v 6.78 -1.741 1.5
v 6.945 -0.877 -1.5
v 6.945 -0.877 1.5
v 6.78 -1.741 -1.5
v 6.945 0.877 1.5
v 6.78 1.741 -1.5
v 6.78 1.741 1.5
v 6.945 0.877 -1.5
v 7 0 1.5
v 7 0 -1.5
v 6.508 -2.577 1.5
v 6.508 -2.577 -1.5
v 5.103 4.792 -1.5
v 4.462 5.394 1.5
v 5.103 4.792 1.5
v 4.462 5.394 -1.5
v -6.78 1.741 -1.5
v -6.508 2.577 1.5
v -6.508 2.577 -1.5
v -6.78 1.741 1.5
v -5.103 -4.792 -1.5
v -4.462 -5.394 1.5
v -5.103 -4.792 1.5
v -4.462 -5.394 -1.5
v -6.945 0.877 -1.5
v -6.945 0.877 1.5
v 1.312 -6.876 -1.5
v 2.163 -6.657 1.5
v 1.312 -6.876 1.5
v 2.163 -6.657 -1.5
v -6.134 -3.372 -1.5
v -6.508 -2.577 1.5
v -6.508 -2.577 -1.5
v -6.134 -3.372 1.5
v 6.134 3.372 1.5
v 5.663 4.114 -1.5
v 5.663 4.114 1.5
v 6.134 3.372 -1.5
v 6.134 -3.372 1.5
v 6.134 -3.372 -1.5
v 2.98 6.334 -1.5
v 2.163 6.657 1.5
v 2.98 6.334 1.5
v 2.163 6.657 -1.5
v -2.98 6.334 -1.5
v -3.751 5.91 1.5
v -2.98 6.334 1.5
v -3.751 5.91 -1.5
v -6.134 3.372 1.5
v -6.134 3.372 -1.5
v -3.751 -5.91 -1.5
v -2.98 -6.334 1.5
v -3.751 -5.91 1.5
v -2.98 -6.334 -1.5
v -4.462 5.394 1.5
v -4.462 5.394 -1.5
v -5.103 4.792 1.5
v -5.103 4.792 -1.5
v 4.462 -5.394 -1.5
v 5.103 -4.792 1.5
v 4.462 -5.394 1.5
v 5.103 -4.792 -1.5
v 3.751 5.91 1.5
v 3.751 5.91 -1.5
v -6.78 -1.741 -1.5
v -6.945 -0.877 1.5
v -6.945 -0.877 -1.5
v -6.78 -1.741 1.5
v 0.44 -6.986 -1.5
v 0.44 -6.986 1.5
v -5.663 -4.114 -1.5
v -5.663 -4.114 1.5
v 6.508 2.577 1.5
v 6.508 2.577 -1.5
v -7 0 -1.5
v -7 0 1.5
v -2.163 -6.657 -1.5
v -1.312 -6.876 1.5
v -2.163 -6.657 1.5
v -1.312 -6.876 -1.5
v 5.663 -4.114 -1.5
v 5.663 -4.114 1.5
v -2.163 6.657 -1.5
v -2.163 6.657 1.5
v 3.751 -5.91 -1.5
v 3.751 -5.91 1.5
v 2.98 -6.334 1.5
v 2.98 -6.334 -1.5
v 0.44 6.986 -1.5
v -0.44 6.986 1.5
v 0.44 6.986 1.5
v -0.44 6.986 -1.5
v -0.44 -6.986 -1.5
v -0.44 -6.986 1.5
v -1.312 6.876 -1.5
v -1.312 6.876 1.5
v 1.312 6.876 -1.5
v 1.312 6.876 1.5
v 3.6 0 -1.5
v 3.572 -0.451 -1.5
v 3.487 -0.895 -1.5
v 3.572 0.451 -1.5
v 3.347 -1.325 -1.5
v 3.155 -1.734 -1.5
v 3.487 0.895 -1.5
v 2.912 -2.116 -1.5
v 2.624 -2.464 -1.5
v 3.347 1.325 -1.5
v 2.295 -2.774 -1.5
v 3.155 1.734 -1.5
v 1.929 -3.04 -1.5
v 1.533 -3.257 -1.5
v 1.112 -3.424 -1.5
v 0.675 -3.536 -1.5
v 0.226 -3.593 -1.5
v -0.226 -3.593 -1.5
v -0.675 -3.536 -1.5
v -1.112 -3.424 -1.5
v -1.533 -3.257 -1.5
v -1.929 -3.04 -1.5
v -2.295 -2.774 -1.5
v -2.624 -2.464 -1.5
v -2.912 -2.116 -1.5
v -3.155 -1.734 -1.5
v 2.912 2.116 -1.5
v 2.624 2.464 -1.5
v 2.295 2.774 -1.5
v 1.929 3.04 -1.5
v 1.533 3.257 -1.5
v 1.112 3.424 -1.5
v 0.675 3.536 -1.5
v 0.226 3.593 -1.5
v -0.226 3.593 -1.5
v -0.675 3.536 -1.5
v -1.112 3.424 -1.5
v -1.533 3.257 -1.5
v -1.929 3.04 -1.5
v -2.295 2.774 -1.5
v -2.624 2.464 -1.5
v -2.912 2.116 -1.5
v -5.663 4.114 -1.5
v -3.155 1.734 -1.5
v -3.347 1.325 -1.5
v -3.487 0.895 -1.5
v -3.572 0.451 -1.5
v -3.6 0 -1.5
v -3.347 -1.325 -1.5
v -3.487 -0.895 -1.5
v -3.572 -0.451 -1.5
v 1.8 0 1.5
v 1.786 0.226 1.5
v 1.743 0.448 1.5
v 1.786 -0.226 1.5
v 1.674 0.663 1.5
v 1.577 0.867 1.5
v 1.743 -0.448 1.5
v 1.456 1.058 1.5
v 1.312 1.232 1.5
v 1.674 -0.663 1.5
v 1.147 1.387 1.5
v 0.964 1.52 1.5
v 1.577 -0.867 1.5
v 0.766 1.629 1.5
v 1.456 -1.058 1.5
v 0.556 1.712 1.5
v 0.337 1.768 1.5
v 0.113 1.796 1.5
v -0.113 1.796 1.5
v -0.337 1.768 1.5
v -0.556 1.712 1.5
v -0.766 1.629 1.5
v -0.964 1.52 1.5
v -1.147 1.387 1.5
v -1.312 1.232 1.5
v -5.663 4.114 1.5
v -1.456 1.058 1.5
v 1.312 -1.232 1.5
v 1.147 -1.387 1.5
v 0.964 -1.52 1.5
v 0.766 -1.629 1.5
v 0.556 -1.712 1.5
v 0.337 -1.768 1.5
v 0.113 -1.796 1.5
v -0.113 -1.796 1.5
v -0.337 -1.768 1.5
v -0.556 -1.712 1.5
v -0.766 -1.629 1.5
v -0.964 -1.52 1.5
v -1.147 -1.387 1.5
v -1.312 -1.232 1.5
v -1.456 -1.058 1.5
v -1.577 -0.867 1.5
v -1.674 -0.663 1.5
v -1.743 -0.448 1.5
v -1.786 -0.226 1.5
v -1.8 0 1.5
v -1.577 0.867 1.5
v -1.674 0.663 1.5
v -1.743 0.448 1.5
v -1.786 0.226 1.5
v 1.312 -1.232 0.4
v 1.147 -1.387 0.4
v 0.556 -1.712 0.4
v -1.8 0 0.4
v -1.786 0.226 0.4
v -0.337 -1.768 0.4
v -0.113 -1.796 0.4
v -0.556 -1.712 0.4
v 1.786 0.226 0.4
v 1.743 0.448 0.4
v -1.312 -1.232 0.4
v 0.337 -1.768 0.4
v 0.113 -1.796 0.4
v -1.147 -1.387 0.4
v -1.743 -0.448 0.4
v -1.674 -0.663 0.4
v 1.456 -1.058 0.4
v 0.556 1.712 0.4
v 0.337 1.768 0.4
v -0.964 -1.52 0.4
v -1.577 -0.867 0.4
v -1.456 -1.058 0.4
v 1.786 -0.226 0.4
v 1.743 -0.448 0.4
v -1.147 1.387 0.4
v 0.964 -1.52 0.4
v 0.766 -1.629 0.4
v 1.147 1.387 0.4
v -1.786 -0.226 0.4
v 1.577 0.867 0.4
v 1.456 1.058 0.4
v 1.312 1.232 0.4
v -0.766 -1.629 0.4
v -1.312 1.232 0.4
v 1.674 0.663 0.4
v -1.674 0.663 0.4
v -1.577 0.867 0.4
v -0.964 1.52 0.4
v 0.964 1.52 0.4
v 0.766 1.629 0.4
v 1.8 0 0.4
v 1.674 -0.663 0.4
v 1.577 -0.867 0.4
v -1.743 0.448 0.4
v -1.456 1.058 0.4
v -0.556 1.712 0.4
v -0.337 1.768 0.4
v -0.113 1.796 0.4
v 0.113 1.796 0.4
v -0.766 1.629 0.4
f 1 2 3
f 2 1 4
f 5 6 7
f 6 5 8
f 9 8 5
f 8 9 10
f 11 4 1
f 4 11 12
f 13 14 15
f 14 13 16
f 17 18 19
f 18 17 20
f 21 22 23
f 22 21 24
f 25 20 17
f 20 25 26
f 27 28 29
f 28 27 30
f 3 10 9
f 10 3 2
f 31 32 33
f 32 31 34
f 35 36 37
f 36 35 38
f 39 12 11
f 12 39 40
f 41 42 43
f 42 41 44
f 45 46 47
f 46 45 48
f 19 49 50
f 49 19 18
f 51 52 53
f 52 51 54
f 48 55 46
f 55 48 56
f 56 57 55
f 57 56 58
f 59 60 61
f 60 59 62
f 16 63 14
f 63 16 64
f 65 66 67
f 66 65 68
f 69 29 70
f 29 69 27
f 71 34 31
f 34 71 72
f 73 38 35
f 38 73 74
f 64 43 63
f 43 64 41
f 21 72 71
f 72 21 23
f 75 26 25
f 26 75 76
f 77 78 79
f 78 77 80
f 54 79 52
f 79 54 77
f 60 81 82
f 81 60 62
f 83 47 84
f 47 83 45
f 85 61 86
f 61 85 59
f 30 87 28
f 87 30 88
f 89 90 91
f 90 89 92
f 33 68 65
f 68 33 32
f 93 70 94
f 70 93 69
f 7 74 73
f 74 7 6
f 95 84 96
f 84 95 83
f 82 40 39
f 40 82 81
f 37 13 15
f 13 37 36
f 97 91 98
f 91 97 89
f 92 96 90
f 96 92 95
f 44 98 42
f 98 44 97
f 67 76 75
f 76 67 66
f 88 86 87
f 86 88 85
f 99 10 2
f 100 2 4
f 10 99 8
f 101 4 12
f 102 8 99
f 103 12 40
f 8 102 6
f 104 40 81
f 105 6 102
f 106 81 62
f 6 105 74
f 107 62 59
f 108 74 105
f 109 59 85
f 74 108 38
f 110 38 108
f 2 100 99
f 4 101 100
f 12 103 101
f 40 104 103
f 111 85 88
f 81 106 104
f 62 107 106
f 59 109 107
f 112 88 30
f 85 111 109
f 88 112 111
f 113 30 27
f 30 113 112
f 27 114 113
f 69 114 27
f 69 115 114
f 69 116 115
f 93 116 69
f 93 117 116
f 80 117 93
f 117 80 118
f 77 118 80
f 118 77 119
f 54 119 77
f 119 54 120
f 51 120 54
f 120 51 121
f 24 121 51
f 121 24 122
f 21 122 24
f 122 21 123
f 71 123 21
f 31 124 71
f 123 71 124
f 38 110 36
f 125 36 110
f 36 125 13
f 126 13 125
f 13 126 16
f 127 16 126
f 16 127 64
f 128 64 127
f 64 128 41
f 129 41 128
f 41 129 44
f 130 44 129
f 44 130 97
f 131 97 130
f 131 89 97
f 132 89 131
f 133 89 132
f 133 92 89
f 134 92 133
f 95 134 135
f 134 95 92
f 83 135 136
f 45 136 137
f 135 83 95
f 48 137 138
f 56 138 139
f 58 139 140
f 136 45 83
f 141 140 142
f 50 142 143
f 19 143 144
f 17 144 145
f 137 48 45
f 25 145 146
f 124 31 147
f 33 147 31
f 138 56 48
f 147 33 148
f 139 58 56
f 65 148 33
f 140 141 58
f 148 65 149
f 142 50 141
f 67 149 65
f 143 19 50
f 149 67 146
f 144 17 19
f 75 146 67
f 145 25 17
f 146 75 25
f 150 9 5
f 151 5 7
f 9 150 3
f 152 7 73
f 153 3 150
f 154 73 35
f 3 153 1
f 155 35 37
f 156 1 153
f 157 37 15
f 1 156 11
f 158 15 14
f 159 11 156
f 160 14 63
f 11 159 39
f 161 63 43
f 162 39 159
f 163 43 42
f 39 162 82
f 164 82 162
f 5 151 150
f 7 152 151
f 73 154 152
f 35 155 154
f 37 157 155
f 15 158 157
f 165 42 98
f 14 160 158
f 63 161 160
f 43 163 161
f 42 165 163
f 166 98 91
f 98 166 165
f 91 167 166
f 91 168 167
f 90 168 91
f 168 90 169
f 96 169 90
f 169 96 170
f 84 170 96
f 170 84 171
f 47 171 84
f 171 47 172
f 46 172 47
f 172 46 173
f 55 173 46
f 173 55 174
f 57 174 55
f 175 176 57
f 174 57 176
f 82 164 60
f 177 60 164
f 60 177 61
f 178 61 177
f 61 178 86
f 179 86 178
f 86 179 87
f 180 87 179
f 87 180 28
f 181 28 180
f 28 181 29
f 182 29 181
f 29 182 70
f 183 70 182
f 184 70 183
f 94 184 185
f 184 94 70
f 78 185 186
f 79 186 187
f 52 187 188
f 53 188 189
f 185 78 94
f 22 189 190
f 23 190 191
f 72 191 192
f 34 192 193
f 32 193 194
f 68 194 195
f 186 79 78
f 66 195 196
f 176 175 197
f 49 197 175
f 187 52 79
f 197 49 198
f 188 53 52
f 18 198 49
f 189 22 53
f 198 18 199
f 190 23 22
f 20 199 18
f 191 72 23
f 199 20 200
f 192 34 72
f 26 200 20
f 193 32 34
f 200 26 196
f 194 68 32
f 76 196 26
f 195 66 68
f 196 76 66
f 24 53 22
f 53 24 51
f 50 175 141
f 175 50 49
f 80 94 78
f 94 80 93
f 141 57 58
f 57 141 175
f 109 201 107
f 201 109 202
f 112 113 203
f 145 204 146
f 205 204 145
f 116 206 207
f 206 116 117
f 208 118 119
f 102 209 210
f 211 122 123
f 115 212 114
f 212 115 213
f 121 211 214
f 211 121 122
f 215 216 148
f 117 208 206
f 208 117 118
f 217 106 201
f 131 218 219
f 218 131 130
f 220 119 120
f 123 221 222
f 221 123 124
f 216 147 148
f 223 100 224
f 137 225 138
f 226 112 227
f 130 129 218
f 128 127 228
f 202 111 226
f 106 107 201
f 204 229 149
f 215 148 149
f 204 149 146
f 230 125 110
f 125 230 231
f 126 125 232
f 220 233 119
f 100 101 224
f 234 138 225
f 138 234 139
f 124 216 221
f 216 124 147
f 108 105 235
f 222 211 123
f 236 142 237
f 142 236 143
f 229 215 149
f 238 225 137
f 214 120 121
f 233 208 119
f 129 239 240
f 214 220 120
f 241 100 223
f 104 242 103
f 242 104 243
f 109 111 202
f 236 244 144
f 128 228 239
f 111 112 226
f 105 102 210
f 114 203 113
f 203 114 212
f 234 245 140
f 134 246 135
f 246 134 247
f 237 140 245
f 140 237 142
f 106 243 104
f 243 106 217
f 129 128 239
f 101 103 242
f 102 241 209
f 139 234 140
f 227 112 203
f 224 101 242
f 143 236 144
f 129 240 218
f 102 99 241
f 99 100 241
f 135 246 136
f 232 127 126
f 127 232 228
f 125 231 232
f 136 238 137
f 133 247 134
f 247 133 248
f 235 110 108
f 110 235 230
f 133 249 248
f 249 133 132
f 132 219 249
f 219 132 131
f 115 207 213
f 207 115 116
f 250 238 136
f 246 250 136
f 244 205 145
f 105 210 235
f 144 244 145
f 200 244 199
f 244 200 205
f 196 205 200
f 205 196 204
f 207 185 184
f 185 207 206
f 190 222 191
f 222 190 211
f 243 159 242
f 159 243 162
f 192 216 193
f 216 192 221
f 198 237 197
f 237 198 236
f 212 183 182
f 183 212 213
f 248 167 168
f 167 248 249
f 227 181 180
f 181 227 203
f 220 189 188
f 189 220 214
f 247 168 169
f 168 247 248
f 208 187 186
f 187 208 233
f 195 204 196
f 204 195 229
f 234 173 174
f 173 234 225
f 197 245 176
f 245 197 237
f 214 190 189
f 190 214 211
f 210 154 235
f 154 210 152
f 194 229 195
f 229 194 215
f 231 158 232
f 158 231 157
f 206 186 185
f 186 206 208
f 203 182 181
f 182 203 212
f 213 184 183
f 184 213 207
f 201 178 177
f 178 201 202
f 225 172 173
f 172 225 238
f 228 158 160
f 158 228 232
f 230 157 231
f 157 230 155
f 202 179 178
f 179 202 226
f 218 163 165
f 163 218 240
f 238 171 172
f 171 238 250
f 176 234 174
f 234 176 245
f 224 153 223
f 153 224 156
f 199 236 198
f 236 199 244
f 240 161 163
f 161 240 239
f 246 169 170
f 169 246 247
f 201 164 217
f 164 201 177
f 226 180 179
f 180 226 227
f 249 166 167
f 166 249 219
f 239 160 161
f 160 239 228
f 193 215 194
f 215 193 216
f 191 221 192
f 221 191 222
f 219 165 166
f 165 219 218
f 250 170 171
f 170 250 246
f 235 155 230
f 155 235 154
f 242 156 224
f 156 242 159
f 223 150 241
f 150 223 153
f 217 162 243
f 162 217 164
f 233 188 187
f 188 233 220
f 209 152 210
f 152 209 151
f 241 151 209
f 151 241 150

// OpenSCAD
$fn = 50;


difference() {
	union() {
		translate(v = [0, 0, -1.5000000000]) {
			cylinder(h = 3, r = 7.0000000000);
		}
		translate(v = [0, 0, -1.5000000000]) {
			cylinder(h = 3, r = 2.8500000000);
		}
	}
	union() {
		translate(v = [0, 0, -1.5000000000]) {
			rotate(a = [0, 180, 0]) {
				difference() {
					union() {
						translate(v = [0, 0, -3.0000000000]) {
							cylinder(h = 3, r = 1.5000000000);
						}
						translate(v = [0, 0, -1.9000000000]) {
							cylinder(h = 1.9000000000, r1 = 1.8000000000, r2 = 3.6000000000);
						}
						translate(v = [0, 0, -3.0000000000]) {
							cylinder(h = 3, r = 1.8000000000);
						}
						translate(v = [0, 0, -3.0000000000]) {
							cylinder(h = 3, r = 1.5000000000);
						}
					}
					union();
				}
			}
		}
		translate(v = [0, 0, -50.0000000000]) {
			cylinder(h = 100, r = 1.8000000000);
		}
	}
}
